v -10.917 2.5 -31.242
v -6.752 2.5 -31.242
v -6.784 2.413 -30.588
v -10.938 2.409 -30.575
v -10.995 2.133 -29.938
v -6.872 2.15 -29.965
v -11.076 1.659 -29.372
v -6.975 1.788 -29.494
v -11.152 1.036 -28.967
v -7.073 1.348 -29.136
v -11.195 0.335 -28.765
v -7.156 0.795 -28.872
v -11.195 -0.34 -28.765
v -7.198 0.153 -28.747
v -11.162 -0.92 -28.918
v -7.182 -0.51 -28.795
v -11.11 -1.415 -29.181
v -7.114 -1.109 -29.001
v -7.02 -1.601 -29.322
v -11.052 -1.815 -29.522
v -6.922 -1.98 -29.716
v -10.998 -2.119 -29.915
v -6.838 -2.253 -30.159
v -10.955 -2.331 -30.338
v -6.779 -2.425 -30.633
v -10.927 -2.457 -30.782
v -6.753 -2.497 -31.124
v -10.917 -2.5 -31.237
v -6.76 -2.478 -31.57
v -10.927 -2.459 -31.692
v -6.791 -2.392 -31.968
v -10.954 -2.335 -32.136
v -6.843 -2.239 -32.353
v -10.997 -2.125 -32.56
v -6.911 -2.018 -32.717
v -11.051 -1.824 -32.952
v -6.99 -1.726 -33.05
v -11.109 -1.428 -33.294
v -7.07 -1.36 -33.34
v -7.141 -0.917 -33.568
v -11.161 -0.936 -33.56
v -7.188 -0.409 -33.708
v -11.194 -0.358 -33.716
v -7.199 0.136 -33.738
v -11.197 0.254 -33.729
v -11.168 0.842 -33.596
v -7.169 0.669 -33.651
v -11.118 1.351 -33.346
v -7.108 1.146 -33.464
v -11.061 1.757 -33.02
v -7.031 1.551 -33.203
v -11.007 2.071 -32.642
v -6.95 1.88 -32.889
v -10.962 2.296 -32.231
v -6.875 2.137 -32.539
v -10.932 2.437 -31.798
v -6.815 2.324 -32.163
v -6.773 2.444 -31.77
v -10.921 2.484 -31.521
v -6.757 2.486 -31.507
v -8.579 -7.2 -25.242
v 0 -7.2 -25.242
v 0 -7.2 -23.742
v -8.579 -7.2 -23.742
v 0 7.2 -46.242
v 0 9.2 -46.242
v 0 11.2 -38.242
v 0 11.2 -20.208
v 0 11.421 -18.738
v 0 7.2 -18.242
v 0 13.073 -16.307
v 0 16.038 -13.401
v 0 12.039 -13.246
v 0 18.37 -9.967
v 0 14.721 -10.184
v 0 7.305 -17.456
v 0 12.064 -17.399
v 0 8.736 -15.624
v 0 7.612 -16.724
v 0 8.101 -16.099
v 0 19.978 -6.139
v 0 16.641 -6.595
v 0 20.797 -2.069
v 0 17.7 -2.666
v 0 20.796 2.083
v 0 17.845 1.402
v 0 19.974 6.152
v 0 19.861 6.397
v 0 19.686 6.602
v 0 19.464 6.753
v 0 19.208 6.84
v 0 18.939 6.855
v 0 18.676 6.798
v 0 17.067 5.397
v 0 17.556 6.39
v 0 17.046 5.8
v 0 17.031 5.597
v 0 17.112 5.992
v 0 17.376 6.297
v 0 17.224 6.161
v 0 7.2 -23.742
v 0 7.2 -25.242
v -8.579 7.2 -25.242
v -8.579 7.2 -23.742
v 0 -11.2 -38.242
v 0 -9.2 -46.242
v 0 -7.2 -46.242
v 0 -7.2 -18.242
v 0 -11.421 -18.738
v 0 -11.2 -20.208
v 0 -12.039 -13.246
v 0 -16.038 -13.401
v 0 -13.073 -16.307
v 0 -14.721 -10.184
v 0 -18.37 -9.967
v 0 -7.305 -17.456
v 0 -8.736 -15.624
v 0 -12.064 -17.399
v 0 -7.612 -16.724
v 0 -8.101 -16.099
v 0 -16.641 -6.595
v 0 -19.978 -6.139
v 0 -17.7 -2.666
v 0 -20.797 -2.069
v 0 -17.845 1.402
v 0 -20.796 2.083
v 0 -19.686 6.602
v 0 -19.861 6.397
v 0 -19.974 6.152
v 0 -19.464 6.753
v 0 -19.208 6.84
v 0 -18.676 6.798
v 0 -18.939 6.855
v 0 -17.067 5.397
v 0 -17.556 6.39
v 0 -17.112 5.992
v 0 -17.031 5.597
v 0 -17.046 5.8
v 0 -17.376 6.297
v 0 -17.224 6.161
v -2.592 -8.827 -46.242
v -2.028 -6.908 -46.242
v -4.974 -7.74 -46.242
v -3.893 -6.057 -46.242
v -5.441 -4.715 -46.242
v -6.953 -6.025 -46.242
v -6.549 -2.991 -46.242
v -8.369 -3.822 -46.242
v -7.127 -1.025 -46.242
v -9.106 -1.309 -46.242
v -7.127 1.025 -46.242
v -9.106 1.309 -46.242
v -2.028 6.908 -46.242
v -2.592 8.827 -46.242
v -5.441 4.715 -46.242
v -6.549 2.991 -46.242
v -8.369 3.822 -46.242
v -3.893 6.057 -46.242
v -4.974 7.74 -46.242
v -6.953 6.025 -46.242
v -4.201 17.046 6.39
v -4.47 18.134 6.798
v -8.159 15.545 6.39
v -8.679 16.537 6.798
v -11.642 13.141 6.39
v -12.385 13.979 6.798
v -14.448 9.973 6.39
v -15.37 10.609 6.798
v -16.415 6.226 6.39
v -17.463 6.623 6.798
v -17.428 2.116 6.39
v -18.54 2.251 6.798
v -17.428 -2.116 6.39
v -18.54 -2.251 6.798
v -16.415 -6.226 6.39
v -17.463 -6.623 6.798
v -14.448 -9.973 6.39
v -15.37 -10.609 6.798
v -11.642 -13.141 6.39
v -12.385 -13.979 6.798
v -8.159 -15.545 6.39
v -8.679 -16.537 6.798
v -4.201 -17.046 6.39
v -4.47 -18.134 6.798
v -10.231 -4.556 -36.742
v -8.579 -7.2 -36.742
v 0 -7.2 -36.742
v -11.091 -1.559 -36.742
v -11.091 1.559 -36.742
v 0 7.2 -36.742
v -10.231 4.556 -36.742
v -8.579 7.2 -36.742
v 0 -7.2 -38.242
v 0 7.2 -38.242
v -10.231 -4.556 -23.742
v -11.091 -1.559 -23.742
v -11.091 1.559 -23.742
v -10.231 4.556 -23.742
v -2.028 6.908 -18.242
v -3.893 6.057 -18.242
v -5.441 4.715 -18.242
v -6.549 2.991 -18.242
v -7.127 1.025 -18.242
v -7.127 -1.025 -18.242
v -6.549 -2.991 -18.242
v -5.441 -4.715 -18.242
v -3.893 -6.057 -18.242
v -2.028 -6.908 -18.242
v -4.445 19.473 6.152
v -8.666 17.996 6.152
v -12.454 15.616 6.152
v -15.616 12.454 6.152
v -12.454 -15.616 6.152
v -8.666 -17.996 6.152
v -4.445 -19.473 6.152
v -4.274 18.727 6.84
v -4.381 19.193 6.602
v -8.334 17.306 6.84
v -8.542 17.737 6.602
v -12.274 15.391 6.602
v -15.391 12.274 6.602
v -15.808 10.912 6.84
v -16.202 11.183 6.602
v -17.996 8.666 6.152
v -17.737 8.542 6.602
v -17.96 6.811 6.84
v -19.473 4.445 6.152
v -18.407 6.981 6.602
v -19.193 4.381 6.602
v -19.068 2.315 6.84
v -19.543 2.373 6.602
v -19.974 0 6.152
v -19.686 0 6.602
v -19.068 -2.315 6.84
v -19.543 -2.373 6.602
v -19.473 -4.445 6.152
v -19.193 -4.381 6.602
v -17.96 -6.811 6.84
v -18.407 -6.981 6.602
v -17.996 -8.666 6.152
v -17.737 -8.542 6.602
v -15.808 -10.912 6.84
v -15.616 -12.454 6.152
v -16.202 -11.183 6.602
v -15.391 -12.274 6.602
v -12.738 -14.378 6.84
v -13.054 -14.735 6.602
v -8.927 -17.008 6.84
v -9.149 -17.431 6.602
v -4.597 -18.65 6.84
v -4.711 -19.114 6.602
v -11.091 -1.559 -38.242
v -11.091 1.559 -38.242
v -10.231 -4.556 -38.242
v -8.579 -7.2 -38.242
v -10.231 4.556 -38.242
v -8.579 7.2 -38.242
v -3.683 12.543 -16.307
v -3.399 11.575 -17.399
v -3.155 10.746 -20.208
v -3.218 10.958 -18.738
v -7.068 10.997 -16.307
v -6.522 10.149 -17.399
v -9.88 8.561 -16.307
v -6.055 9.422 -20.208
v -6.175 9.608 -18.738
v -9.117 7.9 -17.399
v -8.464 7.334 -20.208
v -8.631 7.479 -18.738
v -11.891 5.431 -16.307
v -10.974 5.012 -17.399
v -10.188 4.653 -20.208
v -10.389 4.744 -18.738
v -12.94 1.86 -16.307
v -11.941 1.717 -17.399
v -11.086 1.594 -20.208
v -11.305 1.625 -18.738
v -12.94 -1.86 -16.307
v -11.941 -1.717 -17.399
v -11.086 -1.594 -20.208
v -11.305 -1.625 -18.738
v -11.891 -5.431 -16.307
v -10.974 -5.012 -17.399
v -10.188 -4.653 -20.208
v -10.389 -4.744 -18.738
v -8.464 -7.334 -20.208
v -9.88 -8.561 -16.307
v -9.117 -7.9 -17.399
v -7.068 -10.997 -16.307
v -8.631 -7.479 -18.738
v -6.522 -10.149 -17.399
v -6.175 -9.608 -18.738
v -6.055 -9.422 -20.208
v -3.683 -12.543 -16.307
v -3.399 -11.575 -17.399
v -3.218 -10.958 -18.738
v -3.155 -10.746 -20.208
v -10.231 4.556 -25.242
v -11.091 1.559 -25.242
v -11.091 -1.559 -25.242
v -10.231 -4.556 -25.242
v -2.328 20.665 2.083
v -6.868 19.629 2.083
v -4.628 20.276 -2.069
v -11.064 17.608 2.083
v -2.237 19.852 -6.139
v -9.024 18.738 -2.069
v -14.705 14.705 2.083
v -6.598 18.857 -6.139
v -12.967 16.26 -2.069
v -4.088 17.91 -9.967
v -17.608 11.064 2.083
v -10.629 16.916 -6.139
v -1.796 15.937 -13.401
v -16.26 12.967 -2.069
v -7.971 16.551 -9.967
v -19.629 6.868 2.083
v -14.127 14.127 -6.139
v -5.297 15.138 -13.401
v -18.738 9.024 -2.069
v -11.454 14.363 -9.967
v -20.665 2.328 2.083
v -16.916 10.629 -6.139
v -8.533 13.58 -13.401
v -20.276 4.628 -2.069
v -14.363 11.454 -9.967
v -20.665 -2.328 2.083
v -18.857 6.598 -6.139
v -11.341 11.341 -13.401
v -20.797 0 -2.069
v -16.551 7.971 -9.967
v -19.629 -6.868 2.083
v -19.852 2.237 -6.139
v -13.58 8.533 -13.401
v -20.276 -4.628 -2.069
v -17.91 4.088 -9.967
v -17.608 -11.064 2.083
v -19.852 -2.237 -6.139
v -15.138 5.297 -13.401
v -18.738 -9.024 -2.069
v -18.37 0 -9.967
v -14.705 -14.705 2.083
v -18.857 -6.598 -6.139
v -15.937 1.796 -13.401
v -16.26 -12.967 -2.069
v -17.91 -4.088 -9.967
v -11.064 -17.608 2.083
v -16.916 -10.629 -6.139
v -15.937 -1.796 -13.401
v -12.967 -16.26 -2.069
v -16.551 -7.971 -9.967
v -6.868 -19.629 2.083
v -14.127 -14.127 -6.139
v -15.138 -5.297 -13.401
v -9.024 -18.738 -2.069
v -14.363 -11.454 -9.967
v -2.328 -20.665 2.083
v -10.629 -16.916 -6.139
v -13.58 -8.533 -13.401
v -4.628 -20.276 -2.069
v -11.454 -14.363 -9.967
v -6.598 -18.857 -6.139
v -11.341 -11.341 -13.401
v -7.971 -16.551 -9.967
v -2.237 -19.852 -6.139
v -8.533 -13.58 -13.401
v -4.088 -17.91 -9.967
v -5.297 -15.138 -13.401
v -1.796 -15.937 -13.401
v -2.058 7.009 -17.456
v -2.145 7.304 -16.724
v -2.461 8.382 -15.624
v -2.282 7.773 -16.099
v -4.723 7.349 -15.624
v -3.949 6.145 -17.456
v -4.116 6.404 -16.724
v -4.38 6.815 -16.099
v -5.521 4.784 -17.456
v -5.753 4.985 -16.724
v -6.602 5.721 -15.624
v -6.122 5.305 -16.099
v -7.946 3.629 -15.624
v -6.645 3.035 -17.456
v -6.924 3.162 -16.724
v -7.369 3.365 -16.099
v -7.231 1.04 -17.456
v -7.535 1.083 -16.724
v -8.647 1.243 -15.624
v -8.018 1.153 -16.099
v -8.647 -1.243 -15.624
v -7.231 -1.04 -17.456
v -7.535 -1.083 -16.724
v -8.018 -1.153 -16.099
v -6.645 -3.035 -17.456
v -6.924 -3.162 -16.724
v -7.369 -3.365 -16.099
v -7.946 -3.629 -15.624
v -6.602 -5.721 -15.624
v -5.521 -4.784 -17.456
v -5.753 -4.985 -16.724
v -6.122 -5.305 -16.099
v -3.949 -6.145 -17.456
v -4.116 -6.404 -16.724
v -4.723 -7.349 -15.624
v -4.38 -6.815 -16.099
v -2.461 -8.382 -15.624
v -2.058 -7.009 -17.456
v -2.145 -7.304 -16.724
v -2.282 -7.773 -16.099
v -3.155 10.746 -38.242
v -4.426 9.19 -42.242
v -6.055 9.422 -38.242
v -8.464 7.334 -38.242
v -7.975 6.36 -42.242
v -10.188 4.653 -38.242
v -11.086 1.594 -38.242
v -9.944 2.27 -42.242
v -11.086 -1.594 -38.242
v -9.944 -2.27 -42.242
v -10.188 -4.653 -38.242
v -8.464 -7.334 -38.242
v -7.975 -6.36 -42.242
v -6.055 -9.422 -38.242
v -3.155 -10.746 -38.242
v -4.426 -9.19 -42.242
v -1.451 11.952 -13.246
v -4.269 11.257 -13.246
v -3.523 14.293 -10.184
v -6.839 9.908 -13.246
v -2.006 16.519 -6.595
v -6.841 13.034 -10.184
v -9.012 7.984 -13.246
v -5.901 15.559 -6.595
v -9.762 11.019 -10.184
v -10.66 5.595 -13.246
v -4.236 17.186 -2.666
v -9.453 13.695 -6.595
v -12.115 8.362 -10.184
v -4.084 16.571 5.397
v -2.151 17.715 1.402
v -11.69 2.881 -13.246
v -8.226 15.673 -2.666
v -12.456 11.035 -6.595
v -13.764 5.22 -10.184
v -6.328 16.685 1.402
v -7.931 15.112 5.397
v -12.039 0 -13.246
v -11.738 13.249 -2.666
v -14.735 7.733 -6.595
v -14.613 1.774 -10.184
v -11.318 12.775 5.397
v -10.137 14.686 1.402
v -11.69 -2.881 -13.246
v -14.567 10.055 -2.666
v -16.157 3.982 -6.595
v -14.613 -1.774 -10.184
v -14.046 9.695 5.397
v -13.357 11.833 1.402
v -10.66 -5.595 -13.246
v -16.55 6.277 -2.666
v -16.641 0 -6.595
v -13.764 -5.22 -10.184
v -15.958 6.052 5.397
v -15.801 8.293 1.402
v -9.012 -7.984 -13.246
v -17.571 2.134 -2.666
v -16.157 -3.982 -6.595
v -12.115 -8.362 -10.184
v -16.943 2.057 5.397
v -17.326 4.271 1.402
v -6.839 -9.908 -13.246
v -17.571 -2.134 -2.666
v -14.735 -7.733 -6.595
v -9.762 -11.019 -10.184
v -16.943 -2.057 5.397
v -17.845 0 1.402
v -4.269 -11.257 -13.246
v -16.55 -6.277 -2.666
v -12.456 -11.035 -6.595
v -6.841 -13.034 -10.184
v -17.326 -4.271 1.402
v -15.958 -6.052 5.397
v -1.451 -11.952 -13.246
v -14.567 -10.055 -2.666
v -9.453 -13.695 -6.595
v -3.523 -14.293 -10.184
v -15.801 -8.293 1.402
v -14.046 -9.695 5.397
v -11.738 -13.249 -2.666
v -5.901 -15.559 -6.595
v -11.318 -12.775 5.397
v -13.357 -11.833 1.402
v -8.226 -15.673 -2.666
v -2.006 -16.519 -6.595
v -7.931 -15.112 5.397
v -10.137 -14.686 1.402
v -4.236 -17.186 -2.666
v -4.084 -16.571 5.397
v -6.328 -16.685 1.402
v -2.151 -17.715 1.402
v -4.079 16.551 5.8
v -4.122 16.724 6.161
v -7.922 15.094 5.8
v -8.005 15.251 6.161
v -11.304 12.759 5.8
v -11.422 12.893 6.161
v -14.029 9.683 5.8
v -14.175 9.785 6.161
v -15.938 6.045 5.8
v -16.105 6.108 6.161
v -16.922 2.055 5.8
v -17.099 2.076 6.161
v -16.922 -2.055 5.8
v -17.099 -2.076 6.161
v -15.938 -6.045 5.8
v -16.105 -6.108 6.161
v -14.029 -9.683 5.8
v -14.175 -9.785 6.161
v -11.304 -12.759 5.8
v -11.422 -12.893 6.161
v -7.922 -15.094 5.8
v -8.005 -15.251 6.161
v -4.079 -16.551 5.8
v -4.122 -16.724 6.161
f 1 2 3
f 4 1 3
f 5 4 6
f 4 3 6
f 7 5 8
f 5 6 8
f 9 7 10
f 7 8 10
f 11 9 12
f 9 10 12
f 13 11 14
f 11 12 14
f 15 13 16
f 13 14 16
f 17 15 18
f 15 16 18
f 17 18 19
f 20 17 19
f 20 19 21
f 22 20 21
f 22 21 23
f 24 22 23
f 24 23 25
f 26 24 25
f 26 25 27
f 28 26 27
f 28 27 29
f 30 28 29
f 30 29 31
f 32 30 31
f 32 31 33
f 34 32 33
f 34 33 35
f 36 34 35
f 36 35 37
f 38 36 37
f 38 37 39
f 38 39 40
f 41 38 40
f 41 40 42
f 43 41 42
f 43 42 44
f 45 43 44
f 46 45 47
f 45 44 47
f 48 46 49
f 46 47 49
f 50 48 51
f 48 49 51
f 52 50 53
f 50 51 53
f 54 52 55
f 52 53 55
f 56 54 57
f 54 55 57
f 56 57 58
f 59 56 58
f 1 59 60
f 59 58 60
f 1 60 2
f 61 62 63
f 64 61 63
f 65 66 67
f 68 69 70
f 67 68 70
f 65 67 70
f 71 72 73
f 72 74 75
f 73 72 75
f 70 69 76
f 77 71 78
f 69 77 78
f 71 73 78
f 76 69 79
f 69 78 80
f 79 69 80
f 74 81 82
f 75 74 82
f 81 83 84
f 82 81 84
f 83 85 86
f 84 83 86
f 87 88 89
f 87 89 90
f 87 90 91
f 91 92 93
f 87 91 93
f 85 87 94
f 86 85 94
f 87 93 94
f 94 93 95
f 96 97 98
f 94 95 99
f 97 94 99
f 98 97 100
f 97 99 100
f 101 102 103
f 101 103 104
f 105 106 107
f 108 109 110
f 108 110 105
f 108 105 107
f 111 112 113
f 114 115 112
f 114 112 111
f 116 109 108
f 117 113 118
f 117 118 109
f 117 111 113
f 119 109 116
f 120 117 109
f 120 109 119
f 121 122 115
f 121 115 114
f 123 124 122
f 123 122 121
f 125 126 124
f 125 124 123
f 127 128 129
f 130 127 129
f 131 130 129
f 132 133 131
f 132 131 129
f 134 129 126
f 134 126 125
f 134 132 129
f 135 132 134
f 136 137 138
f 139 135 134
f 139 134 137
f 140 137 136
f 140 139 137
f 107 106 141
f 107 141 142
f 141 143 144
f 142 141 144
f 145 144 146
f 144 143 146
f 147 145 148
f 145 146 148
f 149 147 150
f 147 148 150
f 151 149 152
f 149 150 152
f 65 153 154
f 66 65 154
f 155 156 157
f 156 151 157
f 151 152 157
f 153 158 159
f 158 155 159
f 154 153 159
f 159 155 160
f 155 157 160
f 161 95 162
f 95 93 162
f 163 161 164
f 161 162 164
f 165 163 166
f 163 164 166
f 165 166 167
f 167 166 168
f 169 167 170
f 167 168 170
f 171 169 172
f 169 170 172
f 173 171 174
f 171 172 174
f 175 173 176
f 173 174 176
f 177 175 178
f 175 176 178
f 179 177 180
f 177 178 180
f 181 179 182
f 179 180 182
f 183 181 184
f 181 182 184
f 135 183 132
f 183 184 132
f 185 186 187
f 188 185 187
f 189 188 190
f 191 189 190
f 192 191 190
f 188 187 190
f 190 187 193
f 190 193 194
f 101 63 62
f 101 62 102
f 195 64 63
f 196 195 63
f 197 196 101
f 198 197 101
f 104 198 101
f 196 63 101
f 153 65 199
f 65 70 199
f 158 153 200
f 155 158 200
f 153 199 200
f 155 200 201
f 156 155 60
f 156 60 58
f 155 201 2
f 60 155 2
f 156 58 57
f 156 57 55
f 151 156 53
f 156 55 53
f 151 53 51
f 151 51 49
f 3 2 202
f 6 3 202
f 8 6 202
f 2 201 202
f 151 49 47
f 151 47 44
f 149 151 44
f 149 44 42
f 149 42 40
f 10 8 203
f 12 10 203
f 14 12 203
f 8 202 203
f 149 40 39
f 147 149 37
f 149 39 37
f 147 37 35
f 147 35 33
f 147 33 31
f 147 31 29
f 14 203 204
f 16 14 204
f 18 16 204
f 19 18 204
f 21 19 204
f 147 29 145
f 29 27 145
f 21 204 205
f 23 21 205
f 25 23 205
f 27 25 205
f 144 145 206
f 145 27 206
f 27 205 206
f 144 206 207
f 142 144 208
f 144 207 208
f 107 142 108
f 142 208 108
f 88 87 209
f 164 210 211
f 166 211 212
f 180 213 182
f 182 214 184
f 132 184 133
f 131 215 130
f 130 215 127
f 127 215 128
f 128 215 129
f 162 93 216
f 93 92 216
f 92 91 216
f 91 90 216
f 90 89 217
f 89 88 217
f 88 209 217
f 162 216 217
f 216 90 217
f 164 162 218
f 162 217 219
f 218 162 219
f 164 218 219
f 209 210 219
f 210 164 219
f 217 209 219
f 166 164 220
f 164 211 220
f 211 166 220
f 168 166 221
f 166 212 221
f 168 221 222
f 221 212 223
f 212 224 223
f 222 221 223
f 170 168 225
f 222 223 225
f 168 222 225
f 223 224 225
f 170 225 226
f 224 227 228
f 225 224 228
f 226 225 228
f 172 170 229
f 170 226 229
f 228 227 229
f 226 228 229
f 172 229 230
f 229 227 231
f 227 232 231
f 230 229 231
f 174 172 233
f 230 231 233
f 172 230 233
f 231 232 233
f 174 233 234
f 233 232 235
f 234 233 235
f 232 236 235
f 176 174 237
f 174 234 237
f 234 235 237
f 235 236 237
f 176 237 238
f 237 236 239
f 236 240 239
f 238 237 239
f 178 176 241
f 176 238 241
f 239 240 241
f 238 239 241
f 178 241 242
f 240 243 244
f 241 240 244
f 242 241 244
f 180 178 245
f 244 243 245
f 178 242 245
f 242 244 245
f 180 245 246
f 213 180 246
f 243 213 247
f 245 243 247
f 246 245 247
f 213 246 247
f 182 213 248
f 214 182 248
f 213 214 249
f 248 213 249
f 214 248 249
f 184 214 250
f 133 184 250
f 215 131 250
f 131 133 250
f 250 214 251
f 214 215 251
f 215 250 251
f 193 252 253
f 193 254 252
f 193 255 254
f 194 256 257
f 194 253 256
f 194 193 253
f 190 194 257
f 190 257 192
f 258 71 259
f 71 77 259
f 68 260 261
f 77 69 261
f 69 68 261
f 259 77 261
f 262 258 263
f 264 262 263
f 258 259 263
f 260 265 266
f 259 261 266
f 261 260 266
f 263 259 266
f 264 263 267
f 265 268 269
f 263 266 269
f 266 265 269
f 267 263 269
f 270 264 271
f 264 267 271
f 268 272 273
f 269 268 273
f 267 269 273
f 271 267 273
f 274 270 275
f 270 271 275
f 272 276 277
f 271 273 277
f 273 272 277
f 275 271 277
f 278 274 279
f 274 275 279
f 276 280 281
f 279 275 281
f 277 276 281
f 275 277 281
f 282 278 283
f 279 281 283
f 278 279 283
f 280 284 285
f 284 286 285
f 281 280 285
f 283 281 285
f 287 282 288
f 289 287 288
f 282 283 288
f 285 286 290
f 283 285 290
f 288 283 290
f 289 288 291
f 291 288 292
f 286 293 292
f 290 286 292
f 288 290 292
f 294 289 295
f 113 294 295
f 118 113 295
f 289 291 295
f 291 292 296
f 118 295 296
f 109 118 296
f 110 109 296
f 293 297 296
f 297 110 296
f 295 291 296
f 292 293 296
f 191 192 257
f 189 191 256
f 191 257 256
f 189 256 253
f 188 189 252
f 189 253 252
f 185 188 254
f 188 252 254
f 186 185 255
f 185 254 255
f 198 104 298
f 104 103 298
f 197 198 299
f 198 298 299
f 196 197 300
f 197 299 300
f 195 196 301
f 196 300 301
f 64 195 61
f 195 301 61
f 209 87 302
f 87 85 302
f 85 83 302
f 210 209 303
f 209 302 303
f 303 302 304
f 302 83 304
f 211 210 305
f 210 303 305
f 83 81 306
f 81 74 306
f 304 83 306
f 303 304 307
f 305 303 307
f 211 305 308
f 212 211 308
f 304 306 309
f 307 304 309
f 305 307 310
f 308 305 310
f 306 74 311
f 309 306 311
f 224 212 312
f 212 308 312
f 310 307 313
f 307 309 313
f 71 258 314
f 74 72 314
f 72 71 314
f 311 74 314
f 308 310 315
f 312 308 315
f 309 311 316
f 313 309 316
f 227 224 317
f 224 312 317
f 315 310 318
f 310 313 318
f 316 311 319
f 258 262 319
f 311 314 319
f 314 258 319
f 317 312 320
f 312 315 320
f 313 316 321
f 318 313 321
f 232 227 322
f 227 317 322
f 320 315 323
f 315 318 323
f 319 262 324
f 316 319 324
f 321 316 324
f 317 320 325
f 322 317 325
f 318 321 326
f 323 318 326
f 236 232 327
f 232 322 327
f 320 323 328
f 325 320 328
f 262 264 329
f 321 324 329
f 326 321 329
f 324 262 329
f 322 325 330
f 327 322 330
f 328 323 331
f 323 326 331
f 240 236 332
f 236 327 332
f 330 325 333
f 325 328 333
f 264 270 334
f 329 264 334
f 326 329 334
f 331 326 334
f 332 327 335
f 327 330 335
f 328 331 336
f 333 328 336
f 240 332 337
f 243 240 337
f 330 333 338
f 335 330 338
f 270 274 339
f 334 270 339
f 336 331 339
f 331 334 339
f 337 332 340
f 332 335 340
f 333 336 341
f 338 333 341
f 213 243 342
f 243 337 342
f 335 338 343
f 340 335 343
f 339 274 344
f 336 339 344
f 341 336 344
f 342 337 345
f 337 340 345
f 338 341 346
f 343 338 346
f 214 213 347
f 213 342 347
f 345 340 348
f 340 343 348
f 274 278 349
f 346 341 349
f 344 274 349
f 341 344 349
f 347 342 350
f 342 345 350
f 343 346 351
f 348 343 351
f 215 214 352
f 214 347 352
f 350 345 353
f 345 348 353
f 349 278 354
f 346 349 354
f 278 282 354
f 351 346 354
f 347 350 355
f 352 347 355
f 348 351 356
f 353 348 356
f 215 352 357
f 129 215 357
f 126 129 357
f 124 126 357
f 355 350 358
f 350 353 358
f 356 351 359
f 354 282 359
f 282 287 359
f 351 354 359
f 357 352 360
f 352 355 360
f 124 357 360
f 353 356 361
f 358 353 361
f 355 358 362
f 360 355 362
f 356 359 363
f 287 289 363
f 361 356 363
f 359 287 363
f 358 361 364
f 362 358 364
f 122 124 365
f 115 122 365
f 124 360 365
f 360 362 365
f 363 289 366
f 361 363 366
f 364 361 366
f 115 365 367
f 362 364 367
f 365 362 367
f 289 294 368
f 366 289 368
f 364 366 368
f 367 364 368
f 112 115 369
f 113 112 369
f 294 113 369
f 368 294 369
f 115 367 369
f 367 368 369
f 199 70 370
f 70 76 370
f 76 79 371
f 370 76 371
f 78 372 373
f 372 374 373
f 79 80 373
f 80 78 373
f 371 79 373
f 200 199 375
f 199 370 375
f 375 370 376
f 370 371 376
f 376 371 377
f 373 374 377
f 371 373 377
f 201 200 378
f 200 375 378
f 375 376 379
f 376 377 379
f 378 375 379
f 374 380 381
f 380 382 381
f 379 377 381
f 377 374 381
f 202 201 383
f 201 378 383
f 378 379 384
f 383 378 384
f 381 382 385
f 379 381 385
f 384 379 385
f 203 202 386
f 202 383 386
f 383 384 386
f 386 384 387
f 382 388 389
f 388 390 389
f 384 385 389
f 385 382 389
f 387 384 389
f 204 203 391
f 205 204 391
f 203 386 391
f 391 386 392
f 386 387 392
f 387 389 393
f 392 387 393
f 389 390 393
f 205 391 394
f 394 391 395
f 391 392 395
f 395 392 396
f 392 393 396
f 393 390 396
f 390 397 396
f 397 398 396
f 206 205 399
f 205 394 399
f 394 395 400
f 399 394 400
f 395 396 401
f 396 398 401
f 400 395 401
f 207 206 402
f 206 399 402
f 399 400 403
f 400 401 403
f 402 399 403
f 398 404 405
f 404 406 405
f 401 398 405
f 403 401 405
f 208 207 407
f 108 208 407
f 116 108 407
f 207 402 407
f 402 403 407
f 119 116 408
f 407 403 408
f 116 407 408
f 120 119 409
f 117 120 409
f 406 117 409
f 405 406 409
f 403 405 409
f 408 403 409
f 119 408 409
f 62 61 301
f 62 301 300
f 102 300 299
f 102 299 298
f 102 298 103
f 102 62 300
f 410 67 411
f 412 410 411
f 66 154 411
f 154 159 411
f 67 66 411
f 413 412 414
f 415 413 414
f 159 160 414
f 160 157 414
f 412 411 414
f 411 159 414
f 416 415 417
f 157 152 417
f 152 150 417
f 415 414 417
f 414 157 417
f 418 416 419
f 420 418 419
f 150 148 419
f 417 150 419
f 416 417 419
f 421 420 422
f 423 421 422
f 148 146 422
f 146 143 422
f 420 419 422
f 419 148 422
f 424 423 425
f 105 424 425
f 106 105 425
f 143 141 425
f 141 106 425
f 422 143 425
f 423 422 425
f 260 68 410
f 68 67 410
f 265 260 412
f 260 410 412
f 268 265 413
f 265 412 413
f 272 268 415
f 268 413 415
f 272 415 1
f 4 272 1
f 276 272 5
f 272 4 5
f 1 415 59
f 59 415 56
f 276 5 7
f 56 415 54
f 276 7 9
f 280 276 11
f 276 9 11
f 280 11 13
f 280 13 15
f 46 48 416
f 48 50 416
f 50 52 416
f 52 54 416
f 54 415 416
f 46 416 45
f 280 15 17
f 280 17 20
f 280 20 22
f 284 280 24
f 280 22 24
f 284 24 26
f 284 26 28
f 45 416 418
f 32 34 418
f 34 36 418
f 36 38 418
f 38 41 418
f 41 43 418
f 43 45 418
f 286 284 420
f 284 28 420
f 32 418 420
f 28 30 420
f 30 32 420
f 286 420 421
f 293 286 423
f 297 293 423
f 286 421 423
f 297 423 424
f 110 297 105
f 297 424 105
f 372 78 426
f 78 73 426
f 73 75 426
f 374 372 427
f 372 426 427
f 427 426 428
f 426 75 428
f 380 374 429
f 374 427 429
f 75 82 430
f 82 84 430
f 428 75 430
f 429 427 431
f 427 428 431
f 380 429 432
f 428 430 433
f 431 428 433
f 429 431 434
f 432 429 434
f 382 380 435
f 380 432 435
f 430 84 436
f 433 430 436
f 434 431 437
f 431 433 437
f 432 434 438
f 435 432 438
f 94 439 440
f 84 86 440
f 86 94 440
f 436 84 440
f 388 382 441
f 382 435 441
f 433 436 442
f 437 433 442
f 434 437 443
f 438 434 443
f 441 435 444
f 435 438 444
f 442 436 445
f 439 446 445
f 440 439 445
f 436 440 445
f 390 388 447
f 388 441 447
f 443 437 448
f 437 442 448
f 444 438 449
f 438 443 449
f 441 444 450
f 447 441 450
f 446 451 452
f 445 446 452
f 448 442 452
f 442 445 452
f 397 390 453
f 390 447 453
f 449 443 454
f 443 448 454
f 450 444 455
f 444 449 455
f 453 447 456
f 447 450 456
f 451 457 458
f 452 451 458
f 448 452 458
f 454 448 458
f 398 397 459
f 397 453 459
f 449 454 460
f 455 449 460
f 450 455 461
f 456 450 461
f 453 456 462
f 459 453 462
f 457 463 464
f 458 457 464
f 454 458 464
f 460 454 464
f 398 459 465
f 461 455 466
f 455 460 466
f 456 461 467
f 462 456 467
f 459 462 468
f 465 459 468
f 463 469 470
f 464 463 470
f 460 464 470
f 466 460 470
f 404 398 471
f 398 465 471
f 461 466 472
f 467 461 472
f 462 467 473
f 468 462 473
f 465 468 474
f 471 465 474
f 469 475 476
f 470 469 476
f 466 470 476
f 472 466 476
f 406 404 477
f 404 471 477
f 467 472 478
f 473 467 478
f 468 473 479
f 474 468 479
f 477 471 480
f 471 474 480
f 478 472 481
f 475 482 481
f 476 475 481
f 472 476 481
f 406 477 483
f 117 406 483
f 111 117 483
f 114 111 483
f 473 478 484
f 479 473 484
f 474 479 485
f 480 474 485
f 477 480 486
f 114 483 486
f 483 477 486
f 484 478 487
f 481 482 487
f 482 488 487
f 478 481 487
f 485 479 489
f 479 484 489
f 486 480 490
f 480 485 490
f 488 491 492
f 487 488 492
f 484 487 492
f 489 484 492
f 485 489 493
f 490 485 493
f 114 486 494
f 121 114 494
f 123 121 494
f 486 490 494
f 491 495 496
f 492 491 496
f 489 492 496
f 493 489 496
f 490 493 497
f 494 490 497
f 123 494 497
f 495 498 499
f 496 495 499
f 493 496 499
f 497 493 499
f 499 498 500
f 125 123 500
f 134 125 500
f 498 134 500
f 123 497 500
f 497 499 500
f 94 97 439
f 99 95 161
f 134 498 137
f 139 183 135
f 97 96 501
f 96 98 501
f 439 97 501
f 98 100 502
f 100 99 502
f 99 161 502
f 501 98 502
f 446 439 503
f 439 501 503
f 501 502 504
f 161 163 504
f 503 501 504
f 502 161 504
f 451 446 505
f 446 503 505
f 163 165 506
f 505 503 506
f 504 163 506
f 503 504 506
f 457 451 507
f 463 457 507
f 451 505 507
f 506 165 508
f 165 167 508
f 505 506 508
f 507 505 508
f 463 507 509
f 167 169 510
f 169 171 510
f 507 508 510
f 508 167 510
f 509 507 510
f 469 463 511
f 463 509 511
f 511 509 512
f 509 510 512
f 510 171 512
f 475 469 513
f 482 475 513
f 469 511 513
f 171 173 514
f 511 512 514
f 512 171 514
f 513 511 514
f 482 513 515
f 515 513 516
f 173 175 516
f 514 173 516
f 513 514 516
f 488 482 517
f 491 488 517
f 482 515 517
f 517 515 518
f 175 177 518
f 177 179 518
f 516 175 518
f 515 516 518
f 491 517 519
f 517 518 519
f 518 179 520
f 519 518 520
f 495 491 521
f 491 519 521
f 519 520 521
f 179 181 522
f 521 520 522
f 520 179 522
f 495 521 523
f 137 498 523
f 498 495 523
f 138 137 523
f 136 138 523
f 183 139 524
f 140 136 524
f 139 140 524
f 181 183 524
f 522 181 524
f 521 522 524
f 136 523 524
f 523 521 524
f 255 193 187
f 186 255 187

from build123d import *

# Parameters (mm, degrees)
F1_ANGLE_BACK = 90
F1_ANGLE      = 180
F2_R          = 2.5
F3_DEPTH      = 20.901
F4_W          = 14.4
F4_H          = 1.5


with BuildPart() as f1:
    # F0 (on Front) → F1 (revolve)
    with BuildSketch(Plane.XZ, mode=Mode.PRIVATE) as f1_sk:
        with BuildLine():
            ThreePointArc((-8.7358851675, -15.6235178606), (-16.6406875767, -6.5952647388), (-17.0670091011, 5.3969621402))
            ThreePointArc((-17.0670091011, 5.3969621402), (-17.1121338207, 5.9916969311), (-17.5561643429, 6.3899212487))
            Line((-17.5561643429, 6.3899212487), (-18.6762578623, 6.7976019493))
            ThreePointArc((-18.6762578623, 6.7976019493), (-19.4635415113, 6.75330891), (-19.9739703677, 6.1522766315))
            ThreePointArc((-19.9739703677, 6.1522766315), (-19.978069118, -6.1389538455), (-13.0725868726, -16.3069761899))
            ThreePointArc((-13.0725868726, -16.3069761899), (-11.6923916742, -18.0444968248), (-11.2, -20.208166666))
            Line((-11.2, -20.208166666), (-11.2, -38.2419845412))
            Line((-11.2, -38.2419845412), (-9.2, -46.2419845412))
            Line((-9.2, -46.2419845412), (-7.2, -46.2419845412))
            Line((-7.2, -46.2419845412), (-7.2, -18.2419845412))
            ThreePointArc((-7.2, -18.2419845412), (-7.6123036792, -16.7241480048), (-8.7358851675, -15.6235178606))
        make_face()
    revolve(f1_sk.sketch.rotate(Axis((0, 0, 19.9308469892), (0, 0, 1)), -F1_ANGLE_BACK), axis=Axis((0, 0, 19.9308469892), (0, 0, 1)), revolution_arc=F1_ANGLE)

    # F2 (on Right) → F3 (cut, through all)
    with BuildSketch(Plane.YZ):
        with Locations((0, -31.2419845412)):
            Circle(F2_R)
    extrude(amount=-F3_DEPTH, mode=Mode.SUBTRACT)


with BuildPart() as f5:
    # F4 (on Right) → F5 (new body, up to the last surface of F1)
    with BuildSketch(Plane.YZ):
        with Locations((0, -24.4919845412)):
            Rectangle(F4_W, F4_H)
    extrude(until=Until.LAST, target=f1.part, dir=(-1, 0, 0))


with BuildPart() as f5b:
    # F4 (on Right) → F5, piece 2 (new body, up to the last surface of F1)
    with BuildSketch(Plane.YZ):
        with Locations((0, -37.4919845412)):
            Rectangle(F4_W, F4_H)
    extrude(until=Until.LAST, target=f1.part, dir=(-1, 0, 0))


solid = Compound([f1.part, f5.part, f5b.part])
